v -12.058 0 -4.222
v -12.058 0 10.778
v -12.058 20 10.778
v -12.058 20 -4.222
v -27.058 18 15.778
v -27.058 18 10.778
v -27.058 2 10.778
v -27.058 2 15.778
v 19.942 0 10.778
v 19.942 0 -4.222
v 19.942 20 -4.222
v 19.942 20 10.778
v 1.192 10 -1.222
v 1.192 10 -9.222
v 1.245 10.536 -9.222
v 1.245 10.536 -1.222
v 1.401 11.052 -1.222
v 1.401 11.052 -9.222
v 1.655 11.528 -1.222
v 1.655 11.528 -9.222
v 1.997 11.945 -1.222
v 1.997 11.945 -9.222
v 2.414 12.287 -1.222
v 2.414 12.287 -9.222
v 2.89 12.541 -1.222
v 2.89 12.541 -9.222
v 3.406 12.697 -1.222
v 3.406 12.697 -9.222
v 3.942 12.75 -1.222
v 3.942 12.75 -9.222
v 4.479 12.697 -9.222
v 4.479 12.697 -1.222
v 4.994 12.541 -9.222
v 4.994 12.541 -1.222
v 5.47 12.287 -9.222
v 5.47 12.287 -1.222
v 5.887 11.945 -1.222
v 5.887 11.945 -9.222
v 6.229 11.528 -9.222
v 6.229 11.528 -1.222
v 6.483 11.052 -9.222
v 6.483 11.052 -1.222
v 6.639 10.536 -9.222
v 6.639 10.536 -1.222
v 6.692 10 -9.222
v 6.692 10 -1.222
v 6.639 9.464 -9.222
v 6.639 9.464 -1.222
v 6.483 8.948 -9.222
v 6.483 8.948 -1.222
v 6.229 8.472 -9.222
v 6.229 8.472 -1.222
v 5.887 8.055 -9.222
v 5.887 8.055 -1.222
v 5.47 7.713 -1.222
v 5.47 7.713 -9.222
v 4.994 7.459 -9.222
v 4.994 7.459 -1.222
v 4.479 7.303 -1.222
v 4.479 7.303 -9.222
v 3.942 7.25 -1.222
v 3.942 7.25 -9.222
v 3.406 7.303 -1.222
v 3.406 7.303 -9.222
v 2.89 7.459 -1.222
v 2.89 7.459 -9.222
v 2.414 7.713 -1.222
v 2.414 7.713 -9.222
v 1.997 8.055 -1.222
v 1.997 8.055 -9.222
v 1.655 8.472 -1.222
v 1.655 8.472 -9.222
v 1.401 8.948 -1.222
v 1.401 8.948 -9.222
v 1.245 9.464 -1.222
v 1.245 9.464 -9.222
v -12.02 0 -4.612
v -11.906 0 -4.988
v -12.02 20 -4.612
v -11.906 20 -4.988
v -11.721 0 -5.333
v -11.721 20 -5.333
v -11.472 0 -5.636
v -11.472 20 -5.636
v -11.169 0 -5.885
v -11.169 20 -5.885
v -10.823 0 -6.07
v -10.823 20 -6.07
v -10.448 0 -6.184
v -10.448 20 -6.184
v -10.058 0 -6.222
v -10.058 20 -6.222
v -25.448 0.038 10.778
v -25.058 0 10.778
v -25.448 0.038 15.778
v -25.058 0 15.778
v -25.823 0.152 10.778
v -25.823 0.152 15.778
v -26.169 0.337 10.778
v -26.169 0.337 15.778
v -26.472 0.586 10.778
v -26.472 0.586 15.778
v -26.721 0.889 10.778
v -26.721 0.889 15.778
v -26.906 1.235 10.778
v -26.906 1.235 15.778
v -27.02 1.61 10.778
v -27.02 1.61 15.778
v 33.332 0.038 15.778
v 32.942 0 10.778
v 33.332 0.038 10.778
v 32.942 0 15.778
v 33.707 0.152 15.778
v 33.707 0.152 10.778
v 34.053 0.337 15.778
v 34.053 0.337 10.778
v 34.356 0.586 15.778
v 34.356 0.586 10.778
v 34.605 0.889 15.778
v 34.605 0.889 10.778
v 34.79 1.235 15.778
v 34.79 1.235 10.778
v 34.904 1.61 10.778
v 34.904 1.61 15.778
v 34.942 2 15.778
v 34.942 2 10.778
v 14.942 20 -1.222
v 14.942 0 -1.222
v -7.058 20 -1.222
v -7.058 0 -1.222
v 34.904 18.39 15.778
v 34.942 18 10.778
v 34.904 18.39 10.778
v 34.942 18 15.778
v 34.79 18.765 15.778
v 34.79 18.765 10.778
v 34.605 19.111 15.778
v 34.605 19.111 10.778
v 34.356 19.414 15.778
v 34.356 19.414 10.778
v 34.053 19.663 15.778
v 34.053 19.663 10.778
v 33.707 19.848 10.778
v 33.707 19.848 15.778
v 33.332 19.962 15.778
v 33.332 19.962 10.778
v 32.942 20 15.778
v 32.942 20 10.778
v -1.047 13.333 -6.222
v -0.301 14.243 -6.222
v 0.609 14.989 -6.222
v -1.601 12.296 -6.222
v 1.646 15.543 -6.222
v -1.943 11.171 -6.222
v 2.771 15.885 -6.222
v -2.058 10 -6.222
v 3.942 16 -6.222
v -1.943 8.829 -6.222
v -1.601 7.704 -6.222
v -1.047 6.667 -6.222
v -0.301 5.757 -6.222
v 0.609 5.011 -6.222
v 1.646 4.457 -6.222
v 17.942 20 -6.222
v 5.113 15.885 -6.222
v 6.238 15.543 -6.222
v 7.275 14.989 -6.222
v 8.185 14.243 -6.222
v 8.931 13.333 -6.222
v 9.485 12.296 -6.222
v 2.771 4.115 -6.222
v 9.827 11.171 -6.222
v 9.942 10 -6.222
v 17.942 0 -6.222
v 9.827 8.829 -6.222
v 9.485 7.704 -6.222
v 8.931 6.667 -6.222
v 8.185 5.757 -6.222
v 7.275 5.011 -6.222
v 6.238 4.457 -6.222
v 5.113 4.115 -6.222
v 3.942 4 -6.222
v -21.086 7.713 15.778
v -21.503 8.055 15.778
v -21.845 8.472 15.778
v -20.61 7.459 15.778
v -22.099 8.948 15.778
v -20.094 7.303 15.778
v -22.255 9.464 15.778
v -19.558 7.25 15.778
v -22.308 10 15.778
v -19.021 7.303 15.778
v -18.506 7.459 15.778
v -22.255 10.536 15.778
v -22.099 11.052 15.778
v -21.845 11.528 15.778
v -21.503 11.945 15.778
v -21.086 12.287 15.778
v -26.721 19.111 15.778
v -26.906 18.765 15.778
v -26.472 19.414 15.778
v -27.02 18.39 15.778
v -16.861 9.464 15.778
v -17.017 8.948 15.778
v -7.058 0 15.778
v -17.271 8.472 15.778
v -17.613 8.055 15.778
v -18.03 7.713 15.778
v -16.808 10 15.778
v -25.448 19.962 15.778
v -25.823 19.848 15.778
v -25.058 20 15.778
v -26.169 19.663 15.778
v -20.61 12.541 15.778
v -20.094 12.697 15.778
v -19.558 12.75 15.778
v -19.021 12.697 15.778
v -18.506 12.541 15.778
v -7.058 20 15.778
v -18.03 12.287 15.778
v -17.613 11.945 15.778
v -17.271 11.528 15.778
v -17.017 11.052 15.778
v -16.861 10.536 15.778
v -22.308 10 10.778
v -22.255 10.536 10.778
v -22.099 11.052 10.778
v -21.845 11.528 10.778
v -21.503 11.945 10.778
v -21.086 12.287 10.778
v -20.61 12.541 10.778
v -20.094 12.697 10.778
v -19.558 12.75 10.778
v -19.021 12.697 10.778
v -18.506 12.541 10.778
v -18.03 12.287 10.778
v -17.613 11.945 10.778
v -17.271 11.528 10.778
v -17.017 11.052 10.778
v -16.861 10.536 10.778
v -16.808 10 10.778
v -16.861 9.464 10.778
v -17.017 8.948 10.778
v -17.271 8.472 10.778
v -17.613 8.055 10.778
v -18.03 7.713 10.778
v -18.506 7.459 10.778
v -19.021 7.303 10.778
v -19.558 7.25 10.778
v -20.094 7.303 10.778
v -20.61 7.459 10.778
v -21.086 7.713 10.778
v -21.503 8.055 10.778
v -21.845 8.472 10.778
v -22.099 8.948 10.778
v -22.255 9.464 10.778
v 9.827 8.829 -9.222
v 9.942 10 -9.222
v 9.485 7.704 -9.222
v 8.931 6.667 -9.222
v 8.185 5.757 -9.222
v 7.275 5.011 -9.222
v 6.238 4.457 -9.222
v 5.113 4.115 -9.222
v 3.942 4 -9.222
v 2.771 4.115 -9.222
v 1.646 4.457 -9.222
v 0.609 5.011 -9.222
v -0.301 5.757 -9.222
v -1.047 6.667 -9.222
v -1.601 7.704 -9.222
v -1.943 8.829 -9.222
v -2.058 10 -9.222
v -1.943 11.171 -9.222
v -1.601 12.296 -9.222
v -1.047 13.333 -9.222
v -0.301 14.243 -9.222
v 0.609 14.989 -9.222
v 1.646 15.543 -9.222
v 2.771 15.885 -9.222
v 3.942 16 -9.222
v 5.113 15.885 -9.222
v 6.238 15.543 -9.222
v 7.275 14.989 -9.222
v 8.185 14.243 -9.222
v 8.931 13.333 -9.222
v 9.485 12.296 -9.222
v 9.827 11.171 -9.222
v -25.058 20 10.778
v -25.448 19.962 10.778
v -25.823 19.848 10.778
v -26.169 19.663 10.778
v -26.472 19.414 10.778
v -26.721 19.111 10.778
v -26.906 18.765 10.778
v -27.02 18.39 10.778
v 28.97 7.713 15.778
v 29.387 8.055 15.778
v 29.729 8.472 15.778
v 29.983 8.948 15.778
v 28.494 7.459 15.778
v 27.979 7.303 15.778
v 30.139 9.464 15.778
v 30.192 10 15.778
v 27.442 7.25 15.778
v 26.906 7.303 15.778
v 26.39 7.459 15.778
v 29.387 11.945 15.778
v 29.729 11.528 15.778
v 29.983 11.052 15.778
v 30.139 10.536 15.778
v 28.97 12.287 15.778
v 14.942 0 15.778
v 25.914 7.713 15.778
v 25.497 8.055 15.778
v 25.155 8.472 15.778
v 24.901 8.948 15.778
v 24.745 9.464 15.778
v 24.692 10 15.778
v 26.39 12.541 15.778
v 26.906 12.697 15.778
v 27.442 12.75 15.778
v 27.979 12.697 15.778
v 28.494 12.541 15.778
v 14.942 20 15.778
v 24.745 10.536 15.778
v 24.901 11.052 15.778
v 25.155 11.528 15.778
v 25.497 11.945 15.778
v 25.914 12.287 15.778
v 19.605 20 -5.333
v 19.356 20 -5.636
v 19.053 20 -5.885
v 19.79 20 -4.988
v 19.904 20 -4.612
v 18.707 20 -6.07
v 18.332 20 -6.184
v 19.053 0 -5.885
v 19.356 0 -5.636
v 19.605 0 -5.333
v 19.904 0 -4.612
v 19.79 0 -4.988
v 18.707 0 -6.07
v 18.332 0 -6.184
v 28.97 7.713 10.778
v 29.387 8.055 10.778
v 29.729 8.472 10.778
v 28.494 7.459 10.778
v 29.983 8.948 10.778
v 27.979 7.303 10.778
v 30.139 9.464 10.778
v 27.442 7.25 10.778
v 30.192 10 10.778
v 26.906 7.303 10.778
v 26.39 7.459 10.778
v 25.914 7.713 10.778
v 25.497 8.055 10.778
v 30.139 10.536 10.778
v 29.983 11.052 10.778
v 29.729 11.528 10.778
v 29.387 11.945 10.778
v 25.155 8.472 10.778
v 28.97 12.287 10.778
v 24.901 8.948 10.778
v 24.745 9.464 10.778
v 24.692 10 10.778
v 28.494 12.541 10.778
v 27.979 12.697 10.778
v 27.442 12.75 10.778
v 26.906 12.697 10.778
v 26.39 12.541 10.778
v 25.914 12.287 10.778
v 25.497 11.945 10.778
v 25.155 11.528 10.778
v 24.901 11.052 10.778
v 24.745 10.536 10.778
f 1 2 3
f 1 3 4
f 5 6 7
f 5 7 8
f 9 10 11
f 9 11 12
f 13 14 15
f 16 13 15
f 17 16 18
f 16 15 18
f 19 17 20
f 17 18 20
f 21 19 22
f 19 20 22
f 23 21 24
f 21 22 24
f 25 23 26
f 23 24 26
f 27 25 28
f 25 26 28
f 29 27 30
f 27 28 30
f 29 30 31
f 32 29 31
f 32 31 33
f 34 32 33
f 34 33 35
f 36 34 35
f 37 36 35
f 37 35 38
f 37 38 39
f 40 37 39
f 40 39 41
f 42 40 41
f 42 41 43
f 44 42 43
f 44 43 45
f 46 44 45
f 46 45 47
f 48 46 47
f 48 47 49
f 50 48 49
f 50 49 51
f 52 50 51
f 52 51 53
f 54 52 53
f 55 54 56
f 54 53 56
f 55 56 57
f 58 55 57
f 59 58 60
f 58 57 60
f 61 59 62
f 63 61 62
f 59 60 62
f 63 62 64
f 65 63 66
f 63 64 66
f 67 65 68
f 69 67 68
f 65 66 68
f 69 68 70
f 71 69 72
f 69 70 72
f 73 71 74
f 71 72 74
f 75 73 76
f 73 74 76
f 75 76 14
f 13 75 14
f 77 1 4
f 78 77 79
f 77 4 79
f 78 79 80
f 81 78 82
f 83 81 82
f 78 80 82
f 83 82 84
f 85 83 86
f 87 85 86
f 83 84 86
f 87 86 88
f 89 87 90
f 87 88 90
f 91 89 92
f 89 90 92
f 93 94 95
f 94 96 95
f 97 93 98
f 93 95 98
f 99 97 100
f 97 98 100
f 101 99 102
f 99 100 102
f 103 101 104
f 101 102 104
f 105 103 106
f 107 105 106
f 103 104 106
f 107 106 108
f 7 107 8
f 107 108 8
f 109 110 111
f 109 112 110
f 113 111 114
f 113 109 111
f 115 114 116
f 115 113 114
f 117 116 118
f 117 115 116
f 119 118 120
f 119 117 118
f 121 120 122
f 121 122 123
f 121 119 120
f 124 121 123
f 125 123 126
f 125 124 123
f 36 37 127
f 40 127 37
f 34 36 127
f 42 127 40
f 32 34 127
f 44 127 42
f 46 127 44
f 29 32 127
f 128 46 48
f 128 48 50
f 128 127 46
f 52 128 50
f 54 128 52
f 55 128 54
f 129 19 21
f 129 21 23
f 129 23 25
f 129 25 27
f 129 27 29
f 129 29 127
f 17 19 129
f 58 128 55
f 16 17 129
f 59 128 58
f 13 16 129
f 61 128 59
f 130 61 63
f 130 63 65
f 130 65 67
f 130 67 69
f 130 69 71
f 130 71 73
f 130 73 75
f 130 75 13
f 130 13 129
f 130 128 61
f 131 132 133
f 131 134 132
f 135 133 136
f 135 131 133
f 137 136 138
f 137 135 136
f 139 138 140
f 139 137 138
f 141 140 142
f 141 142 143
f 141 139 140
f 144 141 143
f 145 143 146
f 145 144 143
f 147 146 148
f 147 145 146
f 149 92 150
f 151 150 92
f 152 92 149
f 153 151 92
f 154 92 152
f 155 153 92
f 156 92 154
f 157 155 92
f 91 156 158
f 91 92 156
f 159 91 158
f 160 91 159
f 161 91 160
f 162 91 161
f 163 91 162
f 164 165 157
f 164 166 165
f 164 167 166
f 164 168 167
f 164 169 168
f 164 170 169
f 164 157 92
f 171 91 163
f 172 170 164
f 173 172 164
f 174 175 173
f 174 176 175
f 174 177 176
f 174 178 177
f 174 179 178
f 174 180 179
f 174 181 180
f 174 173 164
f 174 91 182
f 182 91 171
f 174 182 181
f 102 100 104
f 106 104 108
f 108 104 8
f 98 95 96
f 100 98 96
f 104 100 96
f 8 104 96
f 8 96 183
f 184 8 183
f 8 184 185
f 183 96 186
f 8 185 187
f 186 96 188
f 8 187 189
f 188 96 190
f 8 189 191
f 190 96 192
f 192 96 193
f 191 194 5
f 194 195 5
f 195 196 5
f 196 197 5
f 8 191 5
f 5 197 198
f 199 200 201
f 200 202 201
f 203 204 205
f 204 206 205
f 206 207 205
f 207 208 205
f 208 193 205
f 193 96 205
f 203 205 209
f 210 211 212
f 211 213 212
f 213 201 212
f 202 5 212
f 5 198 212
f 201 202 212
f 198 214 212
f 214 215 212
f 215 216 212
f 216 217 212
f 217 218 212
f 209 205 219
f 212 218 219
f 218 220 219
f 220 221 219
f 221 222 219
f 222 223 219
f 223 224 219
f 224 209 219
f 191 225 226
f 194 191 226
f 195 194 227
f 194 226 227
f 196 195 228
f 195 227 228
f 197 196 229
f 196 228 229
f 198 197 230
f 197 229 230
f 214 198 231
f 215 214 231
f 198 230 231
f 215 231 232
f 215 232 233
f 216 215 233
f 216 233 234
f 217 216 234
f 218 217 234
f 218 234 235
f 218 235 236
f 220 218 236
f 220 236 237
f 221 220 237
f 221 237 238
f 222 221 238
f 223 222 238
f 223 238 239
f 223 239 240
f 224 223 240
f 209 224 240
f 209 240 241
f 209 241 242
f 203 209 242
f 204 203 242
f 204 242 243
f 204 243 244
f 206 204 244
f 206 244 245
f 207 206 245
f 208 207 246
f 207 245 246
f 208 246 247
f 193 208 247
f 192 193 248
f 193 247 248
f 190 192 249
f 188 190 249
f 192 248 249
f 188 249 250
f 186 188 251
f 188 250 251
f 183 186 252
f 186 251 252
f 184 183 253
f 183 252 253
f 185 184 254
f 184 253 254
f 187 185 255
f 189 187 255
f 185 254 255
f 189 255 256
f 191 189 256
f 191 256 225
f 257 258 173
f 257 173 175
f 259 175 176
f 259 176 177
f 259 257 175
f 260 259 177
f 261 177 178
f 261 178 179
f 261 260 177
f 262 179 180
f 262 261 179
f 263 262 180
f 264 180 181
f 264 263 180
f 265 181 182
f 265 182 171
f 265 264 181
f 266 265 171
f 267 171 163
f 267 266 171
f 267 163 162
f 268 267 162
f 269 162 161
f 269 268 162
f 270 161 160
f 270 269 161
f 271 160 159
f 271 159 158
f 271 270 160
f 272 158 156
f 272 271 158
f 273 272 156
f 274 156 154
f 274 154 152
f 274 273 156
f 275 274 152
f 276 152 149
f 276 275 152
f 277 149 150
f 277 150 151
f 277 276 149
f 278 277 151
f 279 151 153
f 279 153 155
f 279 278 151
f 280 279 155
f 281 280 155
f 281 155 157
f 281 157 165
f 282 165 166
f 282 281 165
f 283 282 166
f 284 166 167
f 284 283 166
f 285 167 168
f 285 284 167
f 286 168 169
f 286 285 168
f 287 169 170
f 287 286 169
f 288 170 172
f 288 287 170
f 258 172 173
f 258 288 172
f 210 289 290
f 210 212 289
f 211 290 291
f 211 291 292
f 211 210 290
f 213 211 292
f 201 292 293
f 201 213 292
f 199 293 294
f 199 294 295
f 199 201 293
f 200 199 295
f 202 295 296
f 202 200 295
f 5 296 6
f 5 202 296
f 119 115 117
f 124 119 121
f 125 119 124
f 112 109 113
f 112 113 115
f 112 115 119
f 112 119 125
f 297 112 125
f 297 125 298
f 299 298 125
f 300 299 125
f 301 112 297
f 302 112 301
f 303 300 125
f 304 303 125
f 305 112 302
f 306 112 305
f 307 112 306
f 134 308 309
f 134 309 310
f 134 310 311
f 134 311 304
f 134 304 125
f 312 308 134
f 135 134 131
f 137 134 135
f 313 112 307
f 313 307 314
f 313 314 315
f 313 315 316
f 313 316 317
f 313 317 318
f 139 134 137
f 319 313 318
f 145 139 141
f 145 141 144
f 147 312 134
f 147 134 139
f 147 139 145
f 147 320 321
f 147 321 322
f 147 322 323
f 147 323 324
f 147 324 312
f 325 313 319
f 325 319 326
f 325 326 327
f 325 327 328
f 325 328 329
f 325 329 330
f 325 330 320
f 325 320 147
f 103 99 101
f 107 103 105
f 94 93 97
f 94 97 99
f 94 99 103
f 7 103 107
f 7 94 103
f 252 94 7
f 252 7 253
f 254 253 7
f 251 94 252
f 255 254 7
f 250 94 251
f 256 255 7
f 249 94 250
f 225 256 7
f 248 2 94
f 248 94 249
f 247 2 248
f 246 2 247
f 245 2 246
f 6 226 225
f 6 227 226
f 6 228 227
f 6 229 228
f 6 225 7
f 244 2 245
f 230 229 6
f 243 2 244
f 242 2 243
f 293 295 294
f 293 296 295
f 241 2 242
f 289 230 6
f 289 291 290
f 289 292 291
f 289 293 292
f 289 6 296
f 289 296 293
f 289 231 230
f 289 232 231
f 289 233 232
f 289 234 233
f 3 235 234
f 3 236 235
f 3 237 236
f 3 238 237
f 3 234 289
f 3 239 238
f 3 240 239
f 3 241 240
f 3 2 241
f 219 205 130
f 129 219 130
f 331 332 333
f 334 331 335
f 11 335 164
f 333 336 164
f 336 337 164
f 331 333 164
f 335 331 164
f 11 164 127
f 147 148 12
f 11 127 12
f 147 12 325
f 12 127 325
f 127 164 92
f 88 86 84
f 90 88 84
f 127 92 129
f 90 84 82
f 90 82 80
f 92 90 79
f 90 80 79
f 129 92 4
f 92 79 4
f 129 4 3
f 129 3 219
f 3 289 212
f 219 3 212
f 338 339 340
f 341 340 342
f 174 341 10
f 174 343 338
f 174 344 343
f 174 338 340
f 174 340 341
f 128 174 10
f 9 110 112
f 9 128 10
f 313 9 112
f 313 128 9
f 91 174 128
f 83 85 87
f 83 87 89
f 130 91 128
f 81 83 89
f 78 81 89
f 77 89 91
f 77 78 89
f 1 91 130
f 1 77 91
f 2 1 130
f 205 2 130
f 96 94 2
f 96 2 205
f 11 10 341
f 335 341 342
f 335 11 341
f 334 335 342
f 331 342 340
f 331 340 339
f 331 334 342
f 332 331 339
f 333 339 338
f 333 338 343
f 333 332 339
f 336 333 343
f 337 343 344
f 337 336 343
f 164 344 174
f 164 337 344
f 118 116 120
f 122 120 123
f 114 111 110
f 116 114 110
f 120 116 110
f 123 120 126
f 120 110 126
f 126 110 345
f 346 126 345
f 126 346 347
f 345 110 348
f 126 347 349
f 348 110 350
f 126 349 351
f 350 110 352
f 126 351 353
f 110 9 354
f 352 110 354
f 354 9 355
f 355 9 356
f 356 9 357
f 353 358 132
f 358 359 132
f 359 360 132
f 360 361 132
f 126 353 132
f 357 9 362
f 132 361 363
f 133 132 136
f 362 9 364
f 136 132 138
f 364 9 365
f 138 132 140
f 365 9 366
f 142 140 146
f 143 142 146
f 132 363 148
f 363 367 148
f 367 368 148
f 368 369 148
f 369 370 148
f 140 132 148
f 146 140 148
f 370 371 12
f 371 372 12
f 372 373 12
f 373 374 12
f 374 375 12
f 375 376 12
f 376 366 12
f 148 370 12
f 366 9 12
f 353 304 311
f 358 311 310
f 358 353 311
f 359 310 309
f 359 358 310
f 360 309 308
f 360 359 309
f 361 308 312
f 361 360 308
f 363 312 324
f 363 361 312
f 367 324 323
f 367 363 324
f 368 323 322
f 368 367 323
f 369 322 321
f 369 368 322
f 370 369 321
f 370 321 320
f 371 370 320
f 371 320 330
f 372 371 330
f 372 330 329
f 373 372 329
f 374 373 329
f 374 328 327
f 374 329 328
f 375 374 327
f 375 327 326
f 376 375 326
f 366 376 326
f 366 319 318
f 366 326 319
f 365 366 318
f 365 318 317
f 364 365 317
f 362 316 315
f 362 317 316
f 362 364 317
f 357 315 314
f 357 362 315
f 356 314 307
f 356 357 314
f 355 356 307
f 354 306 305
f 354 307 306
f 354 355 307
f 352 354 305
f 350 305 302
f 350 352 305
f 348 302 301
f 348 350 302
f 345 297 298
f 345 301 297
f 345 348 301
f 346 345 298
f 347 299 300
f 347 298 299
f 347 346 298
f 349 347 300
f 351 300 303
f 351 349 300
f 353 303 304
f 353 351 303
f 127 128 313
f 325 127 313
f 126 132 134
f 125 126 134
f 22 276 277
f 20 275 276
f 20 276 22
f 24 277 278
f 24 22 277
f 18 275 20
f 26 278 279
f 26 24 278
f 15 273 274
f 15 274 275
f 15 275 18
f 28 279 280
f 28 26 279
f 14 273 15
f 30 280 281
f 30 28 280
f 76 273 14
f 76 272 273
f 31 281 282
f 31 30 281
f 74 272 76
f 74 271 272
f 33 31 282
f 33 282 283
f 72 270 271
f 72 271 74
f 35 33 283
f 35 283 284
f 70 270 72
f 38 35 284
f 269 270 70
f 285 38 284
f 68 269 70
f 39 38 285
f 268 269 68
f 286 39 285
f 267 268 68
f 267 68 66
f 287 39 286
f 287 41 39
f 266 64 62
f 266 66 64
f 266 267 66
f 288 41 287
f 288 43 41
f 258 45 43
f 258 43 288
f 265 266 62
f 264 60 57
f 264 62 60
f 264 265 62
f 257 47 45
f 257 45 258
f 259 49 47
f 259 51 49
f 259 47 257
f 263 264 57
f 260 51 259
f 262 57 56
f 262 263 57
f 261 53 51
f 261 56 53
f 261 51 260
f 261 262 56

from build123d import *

# Parameters (mm, degrees)
EXTRUDE_1_DEPTH     = 20
SKETCH_2_R          = 2.75
CUT_EXTRUDE_1_DEPTH = 36.800621783
SKETCH_3_W          = 5
SKETCH_3_H          = 20
EXTRUDE_2_DEPTH     = 15
SKETCH_4_R          = 2.75
CUT_EXTRUDE_2_DEPTH = 38.697928264
FILLET_1_R          = 2
EXTRUDE_START       = 3
SKETCH_5_R          = 6
SKETCH_5_R_2        = 2.75
EXTRUDE_4_DEPTH     = 3


with BuildPart() as part:
    # 草图1 → 凸台-拉伸1 (new body)
    with BuildSketch(Plane(origin=(0, 0, 0), x_dir=(1, 0, 0), z_dir=(0, 1, 0))):
        Polygon((-12.057971014, 6.222222222), (19.942028986, 6.222222222), (19.942028986, -15.777777778), (14.942028986, -15.777777778), (14.942028986, -10.777777778), (14.942028986, 1.222222222), (-7.057971014, 1.222222222), (-7.057971014, -10.777777778), (-7.057971014, -15.777777778), (-12.057971014, -15.777777778), align=None)
    extrude(amount=EXTRUDE_1_DEPTH)

    # 草图2 → 切除-拉伸1 (cut, through all)
    with BuildSketch(Plane(origin=(0, 0, -6.222222222), x_dir=(-1, 0, 0), z_dir=(0, 0, -1))):
        with Locations((-3.942028986, 10)):
            Circle(SKETCH_2_R)
    extrude(amount=-CUT_EXTRUDE_1_DEPTH, mode=Mode.SUBTRACT)

    # 草图3 → 凸台-拉伸2 (add)
    with BuildSketch(Plane.ZY.offset(12.057971014)):
        with Locations((13.277777778, 10)):
            Rectangle(SKETCH_3_W, SKETCH_3_H)
    extrude_2 = extrude(amount=EXTRUDE_2_DEPTH)

    # 草图4 → 切除-拉伸2 (cut, through all)
    with BuildSketch(Plane(origin=(0, 0, 10.777777778), x_dir=(-1, 0, 0), z_dir=(0, 0, -1))):
        with Locations((19.557971014, 10)):
            Circle(SKETCH_4_R)
    cut_extrude_2 = extrude(amount=-CUT_EXTRUDE_2_DEPTH, mode=Mode.SUBTRACT)

    # 镜向5: 凸台-拉伸2, 切除-拉伸2 across plane
    add(extrude_2.mirror(Plane.ZY.offset(-3.942028986)))
    add(cut_extrude_2.mirror(Plane.ZY.offset(-3.942028986)), mode=Mode.SUBTRACT)

    # 圆角1
    fillet_1_edges = [part.edges().sort_by_distance(p)[0] for p in [
        (-12.057971014, 10, -6.222222222),
        (19.942028986, 10, -6.222222222),
        (-27.057971014, 0, 13.277777778),
        (-27.057971014, 20, 13.277777778),
        (34.942028986, 0, 13.277777778),
        (34.942028986, 20, 13.277777778),
    ]]
    fillet(fillet_1_edges, radius=FILLET_1_R)

    # 草图5 → 凸台-拉伸4 (add)
    with BuildSketch(Plane(origin=(0, 0, -6.222222222), x_dir=(-1, 0, 0), z_dir=(0, 0, -1)).offset(EXTRUDE_START)):
        with Locations(Location((-3.942028986, 10, 0), (0, 0, 180))):
            Circle(SKETCH_5_R)
        with Locations((-3.942028986, 10)):
            Circle(SKETCH_5_R_2, mode=Mode.SUBTRACT)
    extrude(amount=-EXTRUDE_4_DEPTH)


solid = part.part
